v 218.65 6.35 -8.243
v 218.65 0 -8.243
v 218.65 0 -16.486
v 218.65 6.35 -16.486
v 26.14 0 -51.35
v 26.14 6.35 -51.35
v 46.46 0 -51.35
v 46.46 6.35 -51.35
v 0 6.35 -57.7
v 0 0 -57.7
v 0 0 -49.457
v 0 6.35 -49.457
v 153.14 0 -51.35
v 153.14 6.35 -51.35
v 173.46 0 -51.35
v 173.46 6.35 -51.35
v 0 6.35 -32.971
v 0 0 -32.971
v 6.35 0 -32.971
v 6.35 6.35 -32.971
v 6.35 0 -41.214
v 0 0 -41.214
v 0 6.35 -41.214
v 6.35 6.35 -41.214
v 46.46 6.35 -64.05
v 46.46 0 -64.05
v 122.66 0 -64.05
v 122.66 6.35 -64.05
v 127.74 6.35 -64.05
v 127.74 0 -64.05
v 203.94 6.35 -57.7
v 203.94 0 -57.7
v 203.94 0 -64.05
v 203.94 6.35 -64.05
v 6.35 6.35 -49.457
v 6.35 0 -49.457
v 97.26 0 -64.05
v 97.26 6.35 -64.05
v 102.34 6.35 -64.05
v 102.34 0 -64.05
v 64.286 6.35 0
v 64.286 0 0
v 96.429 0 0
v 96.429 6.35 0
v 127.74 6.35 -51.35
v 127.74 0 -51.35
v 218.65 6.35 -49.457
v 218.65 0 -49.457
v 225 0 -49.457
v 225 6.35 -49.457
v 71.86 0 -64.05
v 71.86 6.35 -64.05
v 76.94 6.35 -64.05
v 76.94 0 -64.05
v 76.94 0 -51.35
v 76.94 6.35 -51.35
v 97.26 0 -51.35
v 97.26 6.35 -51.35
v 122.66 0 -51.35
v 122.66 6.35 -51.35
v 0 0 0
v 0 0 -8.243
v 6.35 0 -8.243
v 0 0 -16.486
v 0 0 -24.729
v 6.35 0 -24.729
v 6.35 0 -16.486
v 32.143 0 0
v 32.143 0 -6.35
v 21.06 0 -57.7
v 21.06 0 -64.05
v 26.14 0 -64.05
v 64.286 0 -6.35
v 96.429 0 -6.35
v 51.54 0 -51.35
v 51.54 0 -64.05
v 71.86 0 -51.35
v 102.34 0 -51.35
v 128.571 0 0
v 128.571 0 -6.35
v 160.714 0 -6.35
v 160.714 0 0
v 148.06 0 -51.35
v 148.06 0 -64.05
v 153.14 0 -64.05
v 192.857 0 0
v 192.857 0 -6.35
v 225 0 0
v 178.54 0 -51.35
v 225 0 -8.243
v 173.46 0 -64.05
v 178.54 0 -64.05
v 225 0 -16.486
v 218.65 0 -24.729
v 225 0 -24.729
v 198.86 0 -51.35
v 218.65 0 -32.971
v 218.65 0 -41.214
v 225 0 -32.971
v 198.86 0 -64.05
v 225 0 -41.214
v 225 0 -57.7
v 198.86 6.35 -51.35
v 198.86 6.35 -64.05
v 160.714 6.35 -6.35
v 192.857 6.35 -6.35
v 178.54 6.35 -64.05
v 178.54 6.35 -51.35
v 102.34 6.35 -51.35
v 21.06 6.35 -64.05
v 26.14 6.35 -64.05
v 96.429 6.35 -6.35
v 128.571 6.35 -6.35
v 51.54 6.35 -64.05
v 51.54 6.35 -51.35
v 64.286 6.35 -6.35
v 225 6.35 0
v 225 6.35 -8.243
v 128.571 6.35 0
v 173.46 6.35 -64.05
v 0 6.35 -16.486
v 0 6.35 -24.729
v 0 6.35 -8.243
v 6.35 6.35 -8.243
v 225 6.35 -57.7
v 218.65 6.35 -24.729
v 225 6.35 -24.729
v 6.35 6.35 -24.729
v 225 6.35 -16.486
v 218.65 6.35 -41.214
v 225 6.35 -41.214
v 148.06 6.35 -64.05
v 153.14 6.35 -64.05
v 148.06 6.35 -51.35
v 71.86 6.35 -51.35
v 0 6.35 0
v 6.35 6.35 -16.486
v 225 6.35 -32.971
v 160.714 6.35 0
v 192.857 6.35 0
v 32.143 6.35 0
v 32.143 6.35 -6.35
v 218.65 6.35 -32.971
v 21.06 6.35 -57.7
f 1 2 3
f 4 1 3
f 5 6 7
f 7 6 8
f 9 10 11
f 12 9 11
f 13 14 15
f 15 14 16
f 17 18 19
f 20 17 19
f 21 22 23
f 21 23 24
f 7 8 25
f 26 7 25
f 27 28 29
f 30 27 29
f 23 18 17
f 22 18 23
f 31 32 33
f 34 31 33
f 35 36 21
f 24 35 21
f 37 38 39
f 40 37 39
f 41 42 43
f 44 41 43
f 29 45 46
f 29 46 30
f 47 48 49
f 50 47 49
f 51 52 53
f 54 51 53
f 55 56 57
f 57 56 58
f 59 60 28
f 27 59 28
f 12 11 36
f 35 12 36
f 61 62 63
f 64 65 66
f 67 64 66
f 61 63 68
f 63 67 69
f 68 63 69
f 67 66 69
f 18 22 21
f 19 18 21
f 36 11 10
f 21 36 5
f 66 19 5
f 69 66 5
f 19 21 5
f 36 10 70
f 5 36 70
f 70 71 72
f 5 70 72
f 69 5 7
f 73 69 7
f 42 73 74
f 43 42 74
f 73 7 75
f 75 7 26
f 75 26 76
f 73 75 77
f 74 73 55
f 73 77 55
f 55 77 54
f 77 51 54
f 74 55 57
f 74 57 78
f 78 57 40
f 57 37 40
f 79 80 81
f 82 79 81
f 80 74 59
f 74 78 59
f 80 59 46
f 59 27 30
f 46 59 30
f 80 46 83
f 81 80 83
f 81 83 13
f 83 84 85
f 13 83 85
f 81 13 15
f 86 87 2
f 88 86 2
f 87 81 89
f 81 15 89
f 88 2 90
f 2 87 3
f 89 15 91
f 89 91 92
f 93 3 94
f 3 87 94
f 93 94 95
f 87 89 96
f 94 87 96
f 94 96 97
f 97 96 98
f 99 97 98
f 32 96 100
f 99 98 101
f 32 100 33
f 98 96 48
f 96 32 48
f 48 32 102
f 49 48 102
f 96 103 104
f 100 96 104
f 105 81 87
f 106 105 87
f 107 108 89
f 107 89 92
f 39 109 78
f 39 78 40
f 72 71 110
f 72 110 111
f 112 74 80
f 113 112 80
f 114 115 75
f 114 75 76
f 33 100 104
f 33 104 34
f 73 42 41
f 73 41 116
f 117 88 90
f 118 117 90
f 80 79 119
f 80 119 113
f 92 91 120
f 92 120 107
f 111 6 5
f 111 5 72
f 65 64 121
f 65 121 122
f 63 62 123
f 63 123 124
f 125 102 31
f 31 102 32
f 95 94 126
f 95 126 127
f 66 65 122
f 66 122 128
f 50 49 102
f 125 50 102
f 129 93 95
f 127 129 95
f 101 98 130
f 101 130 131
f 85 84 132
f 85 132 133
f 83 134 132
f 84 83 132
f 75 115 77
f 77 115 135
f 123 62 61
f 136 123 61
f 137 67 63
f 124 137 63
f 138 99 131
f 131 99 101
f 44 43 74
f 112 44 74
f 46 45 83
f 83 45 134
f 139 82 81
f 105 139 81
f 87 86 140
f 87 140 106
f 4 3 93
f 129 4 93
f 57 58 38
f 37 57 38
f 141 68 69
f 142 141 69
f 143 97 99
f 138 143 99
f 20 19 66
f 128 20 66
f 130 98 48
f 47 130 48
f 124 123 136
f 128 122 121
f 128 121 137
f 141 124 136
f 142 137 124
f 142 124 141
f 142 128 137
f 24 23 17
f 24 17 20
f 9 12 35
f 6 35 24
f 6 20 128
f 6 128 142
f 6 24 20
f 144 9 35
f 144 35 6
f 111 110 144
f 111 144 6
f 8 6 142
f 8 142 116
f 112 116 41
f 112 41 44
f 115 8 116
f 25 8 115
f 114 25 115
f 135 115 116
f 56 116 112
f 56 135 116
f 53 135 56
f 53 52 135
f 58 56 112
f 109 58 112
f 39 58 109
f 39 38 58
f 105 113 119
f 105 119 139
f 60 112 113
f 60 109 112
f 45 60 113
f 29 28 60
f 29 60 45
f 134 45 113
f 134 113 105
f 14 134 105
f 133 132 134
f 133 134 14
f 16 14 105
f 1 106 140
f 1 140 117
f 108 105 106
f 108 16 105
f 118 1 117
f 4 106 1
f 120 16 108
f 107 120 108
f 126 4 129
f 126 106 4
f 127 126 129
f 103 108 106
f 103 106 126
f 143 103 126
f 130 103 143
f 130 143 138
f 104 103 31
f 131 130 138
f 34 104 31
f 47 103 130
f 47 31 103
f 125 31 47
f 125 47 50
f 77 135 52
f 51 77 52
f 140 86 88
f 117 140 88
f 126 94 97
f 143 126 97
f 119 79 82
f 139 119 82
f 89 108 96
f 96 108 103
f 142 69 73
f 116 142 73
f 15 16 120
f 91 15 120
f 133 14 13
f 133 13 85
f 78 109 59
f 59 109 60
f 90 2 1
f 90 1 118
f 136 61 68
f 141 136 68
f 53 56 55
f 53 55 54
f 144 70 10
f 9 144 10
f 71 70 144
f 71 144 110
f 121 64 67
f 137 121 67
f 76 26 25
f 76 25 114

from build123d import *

# Parameters (mm, degrees)
SKETCH1_W           = 25.792857143
SKETCH1_H           = 6.35
SKETCH1_W_2         = 32.142857143
SKETCH1_W_3         = 6.35
SKETCH1_H_2         = 1.892857143
SKETCH1_H_3         = 8.242857143
BOSS_EXTRUDE1_DEPTH = 6.35
SKETCH2_W           = 225
SKETCH2_H           = 8.242857143
BOSS_EXTRUDE2_DEPTH = 6.35
SKETCH3_W           = 5.08
SKETCH3_H           = 6.35
BOSS_EXTRUDE3_DEPTH = 6.35
SKETCH4_W           = 20.32
SKETCH4_H           = 6.35
CUT_EXTRUDE1_DEPTH  = 6.35


with BuildPart() as part:
    # Sketch1 → Boss-Extrude1 (new body)
    with BuildSketch(Plane(origin=(0, 0, 0), x_dir=(1, 0, 0), z_dir=(0, 1, 0))):
        Polygon((6.35, 6.35), (32.142857143, 6.35), (64.285714286, 6.35), (96.428571429, 6.35), (128.571428571, 6.35), (160.714285714, 6.35), (192.857142857, 6.35), (218.65, 6.35), (218.65, 8.242857143), (218.65, 16.485714286), (218.65, 24.728571429), (218.65, 32.971428571), (218.65, 41.214285714), (218.65, 49.457142857), (218.65, 51.35), (192.857142857, 51.35), (160.714285714, 51.35), (128.571428571, 51.35), (96.428571429, 51.35), (64.285714286, 51.35), (32.142857143, 51.35), (6.35, 51.35), (6.35, 49.457142857), (6.35, 41.214285714), (6.35, 32.971428571), (6.35, 24.728571429), (6.35, 16.485714286), (6.35, 8.242857143), align=None)
        with Locations((19.246428572, 54.525)):
            Rectangle(SKETCH1_W, SKETCH1_H)
        with Locations((80.357142858, 54.525)):
            Rectangle(SKETCH1_W_2, SKETCH1_H)
        with Locations((144.642857143, 54.525)):
            Rectangle(SKETCH1_W_2, SKETCH1_H)
        with Locations((205.753571429, 54.525)):
            Rectangle(SKETCH1_W, SKETCH1_H)
        with Locations((221.825, 54.525)):
            Rectangle(SKETCH1_W_3, SKETCH1_H)
        with Locations((3.175, 54.525)):
            Rectangle(SKETCH1_W_3, SKETCH1_H)
        with Locations((3.175, 50.403571429)):
            Rectangle(SKETCH1_W_3, SKETCH1_H_2)
        with Locations((3.175, 7.296428571)):
            Rectangle(SKETCH1_W_3, SKETCH1_H_2)
        with Locations((3.175, 3.175)):
            Rectangle(SKETCH1_W_3, SKETCH1_H)
        with Locations((19.246428572, 3.175)):
            Rectangle(SKETCH1_W, SKETCH1_H)
        with Locations((80.357142858, 3.175)):
            Rectangle(SKETCH1_W_2, SKETCH1_H)
        with Locations((144.642857143, 3.175)):
            Rectangle(SKETCH1_W_2, SKETCH1_H)
        with Locations((205.753571429, 3.175)):
            Rectangle(SKETCH1_W, SKETCH1_H)
        with Locations((221.825, 3.175)):
            Rectangle(SKETCH1_W_3, SKETCH1_H)
        with Locations((221.825, 7.296428571)):
            Rectangle(SKETCH1_W_3, SKETCH1_H_2)
        with Locations((221.825, 50.403571429)):
            Rectangle(SKETCH1_W_3, SKETCH1_H_2)
        with Locations((221.825, 37.092857143)):
            Rectangle(SKETCH1_W_3, SKETCH1_H_3)
        with Locations((221.825, 20.607142858)):
            Rectangle(SKETCH1_W_3, SKETCH1_H_3)
        with Locations((3.175, 20.607142858)):
            Rectangle(SKETCH1_W_3, SKETCH1_H_3)
        with Locations((3.175, 37.092857143)):
            Rectangle(SKETCH1_W_3, SKETCH1_H_3)
    extrude(amount=BOSS_EXTRUDE1_DEPTH)

    # Sketch2 → Boss-Extrude2 (add)
    with BuildSketch(Plane(origin=(0, 6.35, 0), x_dir=(1, 0, 0), z_dir=(0, 1, 0))):
        with Locations((112.5, 53.578571428)):
            Rectangle(SKETCH2_W, SKETCH2_H)
    extrude(amount=-BOSS_EXTRUDE2_DEPTH)

    # Sketch3 → Boss-Extrude3 (add)
    with BuildSketch(Plane(origin=(0, 6.35, 0), x_dir=(1, 0, 0), z_dir=(0, 1, 0))):
        with Locations((23.6, 60.875)):
            Rectangle(SKETCH3_W, SKETCH3_H)
        with Locations((49, 60.875)):
            Rectangle(SKETCH3_W, SKETCH3_H)
        with Locations((74.4, 60.875)):
            Rectangle(SKETCH3_W, SKETCH3_H)
        with Locations((99.8, 60.875)):
            Rectangle(SKETCH3_W, SKETCH3_H)
        with Locations((125.2, 60.875)):
            Rectangle(SKETCH3_W, SKETCH3_H)
        with Locations((150.6, 60.875)):
            Rectangle(SKETCH3_W, SKETCH3_H)
        with Locations((176, 60.875)):
            Rectangle(SKETCH3_W, SKETCH3_H)
        with Locations((201.4, 60.875)):
            Rectangle(SKETCH3_W, SKETCH3_H)
    extrude(amount=-BOSS_EXTRUDE3_DEPTH)

    # Sketch4 → Cut-Extrude1 (cut)
    with BuildSketch(Plane(origin=(0, 6.35, 0), x_dir=(1, 0, 0), z_dir=(0, 1, 0))):
        with Locations((61.7, 54.525)):
            Rectangle(SKETCH4_W, SKETCH4_H)
        with Locations((36.3, 54.525)):
            Rectangle(SKETCH4_W, SKETCH4_H)
        with Locations((87.1, 54.525)):
            Rectangle(SKETCH4_W, SKETCH4_H)
        with Locations((112.5, 54.525)):
            Rectangle(SKETCH4_W, SKETCH4_H)
        with Locations((137.9, 54.525)):
            Rectangle(SKETCH4_W, SKETCH4_H)
        with Locations((163.3, 54.525)):
            Rectangle(SKETCH4_W, SKETCH4_H)
        with Locations((188.7, 54.525)):
            Rectangle(SKETCH4_W, SKETCH4_H)
    extrude(amount=-CUT_EXTRUDE1_DEPTH, mode=Mode.SUBTRACT)


solid = part.part
